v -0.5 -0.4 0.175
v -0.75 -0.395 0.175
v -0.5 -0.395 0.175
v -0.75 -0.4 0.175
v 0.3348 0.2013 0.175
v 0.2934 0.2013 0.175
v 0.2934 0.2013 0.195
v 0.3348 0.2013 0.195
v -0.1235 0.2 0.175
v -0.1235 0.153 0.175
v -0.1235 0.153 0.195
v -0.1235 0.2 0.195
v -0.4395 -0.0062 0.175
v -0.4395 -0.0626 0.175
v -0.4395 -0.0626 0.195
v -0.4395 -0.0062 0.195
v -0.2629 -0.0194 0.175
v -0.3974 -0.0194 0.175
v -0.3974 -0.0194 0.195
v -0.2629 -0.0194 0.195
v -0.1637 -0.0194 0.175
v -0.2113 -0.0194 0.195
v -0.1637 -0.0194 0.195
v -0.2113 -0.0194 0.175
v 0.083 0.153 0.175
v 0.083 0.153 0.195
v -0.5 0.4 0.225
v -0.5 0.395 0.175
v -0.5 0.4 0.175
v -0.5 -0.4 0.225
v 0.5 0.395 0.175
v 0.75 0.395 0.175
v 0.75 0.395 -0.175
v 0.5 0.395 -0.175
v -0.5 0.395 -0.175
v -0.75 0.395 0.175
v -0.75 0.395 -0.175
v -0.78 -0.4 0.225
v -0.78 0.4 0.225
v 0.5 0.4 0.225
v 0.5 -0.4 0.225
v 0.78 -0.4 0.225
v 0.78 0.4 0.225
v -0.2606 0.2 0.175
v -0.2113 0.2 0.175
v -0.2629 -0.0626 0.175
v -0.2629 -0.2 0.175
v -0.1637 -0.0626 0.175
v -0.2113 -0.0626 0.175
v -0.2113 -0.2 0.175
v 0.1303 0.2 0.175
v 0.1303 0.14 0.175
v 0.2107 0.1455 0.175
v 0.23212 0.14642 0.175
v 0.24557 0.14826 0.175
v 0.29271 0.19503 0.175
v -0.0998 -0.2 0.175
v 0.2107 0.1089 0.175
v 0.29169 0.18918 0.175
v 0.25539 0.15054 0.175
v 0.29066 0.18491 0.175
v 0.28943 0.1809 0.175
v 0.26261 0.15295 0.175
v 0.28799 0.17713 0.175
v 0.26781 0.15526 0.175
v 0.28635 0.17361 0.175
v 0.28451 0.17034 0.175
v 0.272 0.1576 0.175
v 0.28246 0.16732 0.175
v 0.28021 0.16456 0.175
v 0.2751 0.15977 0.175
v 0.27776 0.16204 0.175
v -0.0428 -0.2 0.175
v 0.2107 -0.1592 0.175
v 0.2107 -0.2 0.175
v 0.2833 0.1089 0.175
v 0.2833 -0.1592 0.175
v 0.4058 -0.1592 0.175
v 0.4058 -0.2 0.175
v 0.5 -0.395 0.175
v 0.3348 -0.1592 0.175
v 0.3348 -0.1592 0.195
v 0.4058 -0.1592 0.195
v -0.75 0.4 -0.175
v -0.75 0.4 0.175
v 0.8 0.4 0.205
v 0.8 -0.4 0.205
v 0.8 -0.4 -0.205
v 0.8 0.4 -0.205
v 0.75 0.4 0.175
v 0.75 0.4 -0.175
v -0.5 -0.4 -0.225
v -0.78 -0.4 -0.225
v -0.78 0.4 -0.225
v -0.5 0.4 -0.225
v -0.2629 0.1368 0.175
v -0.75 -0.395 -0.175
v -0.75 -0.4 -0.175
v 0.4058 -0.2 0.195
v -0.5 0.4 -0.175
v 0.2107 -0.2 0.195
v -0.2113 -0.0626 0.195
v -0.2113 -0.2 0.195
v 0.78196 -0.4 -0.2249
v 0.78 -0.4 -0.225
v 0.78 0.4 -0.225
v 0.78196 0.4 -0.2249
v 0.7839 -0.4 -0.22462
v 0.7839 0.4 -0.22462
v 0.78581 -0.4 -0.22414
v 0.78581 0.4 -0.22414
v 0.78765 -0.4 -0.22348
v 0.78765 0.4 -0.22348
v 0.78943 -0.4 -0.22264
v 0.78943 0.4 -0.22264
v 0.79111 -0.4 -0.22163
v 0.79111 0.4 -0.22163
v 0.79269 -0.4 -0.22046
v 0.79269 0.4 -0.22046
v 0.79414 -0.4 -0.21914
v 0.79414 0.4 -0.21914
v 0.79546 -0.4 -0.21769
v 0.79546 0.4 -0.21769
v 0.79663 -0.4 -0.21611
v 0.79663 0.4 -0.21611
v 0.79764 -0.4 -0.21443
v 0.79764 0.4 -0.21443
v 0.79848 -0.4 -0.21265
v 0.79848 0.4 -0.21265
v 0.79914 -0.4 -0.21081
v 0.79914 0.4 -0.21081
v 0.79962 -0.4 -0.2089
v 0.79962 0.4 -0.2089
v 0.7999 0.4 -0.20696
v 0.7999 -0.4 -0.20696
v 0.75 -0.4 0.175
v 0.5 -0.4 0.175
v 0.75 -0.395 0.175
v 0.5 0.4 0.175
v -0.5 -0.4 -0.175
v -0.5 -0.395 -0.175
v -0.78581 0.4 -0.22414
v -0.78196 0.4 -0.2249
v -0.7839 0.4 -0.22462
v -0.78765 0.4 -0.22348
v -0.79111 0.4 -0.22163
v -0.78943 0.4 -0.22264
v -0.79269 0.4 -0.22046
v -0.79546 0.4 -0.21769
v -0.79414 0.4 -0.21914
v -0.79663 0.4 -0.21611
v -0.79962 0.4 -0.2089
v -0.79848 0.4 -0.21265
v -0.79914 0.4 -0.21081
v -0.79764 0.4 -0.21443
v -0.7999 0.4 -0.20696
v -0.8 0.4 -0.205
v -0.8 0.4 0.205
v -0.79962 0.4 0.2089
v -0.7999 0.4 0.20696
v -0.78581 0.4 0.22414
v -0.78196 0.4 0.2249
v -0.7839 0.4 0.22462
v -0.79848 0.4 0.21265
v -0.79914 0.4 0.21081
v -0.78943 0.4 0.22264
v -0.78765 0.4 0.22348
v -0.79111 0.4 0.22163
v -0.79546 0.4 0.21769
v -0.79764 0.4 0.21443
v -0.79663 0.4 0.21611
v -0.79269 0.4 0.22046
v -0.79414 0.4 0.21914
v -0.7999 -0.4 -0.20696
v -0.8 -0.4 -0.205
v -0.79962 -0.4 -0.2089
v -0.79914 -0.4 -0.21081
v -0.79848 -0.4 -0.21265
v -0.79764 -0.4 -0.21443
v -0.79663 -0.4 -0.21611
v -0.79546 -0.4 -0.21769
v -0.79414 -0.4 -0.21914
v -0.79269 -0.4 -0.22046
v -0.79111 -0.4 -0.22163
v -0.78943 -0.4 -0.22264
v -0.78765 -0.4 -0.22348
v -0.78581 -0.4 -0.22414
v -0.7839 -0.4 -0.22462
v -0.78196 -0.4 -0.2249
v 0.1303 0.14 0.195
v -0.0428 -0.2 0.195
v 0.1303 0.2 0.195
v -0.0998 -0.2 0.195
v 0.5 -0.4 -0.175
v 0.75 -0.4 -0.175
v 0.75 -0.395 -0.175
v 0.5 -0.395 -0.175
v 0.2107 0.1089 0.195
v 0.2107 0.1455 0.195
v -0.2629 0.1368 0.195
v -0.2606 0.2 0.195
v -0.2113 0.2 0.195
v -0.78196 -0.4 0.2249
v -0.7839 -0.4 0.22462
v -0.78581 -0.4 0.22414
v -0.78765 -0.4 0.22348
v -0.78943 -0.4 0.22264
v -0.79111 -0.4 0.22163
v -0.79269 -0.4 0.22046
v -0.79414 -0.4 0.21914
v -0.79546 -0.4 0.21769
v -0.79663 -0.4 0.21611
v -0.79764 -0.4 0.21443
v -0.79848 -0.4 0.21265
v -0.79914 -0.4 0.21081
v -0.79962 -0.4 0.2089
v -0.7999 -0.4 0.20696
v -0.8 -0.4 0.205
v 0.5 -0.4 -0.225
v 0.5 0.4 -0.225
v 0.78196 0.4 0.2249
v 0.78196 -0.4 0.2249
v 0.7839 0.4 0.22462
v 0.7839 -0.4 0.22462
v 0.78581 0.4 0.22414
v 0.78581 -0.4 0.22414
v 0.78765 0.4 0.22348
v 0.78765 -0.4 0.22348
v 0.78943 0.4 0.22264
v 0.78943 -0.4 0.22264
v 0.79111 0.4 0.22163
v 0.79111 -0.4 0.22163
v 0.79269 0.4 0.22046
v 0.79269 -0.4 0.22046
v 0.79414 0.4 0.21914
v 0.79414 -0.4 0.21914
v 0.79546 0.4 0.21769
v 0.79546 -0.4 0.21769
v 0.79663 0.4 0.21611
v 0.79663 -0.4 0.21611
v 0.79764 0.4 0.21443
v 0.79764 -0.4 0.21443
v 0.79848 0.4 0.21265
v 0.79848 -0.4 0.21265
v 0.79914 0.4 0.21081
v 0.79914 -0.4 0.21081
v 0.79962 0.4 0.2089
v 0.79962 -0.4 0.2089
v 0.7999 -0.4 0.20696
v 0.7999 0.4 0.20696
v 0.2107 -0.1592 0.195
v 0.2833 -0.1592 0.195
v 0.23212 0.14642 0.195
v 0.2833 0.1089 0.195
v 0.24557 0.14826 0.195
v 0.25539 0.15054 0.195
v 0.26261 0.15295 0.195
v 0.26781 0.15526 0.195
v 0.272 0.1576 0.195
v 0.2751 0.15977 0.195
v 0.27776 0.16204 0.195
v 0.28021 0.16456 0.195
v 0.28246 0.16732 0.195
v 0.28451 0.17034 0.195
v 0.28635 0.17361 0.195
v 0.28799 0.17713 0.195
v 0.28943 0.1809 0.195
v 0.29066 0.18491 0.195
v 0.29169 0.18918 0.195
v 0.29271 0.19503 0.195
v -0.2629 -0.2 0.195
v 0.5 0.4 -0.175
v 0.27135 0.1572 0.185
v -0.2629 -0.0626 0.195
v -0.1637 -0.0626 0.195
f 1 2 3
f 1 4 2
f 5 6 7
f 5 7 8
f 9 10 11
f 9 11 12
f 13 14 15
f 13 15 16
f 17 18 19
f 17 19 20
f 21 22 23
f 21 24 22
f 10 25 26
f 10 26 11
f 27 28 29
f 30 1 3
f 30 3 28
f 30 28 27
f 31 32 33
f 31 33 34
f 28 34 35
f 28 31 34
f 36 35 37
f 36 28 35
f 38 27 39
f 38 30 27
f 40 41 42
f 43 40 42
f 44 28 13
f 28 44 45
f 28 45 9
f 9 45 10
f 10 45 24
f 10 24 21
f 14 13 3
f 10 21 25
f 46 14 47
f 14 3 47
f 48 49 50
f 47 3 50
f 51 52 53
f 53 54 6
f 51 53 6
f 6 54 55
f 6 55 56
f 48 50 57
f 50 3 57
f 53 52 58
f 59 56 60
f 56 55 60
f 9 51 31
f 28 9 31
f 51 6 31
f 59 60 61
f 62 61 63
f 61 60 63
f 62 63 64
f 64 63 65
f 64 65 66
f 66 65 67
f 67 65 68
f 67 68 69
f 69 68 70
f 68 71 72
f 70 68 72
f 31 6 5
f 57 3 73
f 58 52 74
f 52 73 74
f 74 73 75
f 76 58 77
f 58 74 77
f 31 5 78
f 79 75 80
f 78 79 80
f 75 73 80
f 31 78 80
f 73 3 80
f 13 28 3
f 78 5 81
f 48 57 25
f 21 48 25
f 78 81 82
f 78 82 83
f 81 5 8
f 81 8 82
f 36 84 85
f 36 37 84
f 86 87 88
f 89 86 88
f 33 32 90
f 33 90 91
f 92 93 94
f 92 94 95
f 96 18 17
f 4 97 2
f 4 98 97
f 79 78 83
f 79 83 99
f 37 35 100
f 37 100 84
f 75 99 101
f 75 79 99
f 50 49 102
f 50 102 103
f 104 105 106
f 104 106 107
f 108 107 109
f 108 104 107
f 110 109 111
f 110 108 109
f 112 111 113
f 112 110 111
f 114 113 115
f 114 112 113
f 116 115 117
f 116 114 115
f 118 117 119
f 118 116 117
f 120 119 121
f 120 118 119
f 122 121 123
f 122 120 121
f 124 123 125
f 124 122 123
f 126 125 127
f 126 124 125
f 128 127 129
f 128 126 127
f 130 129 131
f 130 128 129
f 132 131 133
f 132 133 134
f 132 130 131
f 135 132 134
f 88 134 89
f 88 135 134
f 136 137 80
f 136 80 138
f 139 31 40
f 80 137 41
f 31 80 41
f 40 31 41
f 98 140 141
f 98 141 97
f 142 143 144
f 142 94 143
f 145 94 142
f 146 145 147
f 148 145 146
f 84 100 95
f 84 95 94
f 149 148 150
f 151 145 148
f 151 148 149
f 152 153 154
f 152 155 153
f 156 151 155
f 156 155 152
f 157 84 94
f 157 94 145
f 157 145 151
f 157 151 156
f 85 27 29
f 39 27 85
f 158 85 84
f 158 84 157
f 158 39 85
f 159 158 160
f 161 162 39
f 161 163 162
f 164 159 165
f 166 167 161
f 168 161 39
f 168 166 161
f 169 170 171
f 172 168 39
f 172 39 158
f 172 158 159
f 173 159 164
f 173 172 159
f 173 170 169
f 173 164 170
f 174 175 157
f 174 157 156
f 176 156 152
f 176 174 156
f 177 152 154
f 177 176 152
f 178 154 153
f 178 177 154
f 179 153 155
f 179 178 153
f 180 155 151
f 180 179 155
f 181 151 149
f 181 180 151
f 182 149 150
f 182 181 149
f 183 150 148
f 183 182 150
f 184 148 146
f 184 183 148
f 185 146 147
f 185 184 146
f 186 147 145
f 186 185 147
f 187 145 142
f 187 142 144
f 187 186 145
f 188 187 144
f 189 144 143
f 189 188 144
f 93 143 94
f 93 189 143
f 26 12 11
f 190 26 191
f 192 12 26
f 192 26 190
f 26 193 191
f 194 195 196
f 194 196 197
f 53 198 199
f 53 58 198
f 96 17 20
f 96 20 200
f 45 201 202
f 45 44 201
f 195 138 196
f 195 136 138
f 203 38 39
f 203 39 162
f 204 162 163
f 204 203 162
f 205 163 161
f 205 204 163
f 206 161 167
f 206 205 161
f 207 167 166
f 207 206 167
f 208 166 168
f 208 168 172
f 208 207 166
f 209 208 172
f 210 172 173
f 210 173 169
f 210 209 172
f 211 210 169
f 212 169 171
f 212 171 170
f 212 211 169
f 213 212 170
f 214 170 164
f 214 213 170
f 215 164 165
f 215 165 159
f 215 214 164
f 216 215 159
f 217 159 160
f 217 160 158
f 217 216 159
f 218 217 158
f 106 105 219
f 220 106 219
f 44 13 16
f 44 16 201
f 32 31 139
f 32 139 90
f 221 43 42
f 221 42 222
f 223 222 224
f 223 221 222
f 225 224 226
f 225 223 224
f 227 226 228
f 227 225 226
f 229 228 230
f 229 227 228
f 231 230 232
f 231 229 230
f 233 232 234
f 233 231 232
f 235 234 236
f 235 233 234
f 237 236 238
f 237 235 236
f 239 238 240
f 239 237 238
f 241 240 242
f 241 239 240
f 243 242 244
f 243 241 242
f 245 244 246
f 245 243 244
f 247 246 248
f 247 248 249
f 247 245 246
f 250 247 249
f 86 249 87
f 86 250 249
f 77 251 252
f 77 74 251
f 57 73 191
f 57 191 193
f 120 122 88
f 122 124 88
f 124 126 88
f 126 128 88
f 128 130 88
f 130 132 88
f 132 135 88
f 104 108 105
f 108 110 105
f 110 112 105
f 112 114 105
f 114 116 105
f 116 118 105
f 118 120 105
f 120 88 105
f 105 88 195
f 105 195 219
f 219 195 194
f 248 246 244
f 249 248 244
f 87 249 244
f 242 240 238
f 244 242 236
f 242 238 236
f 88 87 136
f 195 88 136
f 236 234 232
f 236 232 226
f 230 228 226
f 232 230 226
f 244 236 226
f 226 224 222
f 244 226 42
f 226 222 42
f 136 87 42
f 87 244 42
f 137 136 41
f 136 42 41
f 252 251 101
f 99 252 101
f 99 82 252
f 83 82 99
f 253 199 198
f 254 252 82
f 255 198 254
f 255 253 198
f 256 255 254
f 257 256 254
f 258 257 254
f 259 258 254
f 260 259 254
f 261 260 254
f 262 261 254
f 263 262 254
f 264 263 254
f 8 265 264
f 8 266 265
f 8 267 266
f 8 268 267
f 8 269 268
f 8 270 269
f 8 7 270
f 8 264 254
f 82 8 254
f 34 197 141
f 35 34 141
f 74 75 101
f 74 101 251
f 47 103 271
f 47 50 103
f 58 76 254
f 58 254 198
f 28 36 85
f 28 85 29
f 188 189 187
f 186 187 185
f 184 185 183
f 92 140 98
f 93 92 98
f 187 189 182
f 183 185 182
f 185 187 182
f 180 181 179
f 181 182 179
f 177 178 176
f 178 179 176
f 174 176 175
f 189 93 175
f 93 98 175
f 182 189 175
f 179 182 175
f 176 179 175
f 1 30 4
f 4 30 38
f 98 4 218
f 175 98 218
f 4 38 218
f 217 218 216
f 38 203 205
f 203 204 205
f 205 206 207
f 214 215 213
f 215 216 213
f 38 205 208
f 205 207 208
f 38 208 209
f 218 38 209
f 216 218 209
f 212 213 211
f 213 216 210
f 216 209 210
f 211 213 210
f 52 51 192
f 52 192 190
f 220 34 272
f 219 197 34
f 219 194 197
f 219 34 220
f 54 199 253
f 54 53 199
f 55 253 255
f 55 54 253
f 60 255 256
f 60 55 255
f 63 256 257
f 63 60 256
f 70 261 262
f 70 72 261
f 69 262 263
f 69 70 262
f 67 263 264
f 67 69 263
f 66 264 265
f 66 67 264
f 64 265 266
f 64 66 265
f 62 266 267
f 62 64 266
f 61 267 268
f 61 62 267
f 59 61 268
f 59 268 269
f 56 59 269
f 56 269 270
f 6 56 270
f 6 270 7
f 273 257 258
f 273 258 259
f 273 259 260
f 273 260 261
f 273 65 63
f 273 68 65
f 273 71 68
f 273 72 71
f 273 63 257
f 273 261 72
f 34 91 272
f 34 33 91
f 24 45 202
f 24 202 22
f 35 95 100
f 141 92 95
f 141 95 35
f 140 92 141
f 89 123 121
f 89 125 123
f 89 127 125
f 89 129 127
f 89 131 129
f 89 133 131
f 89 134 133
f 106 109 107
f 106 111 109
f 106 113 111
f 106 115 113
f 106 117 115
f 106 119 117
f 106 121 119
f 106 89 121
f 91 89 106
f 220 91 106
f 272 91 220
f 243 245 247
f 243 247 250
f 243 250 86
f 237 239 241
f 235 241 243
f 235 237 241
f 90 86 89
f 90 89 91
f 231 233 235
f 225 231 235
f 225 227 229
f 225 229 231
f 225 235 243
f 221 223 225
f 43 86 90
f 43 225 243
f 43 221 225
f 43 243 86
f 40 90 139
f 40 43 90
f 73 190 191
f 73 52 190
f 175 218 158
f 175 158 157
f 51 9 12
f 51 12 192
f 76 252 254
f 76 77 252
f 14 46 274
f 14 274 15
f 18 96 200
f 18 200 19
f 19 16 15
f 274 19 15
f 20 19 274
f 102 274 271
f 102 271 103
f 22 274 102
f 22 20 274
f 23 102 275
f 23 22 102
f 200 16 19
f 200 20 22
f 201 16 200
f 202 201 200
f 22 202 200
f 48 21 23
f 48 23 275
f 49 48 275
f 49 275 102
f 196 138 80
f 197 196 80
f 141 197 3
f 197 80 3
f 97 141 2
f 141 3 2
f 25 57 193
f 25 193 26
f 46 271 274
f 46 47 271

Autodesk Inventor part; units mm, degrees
ref_plane "YZ Plane" through (0, 0, 0) normal (1, 0, 0) x (0, 1, 0)
ref_plane "XZ Plane" through (0, 0, 0) normal (0, 1, 0) x (-1, 0, 0)
ref_plane "XY Plane" through (0, 0, 0) normal (0, 0, 1) x (1, 0, 0)
sketch "Sketch1" plane through (0, 0, 0) normal (0, 1, 0) x (-1, 0, 0)
  line L0 (0.75, 0.175) -> (-0.75, 0.175)
  line L1 (-0.75, 0.175) -> (-0.75, -0.175)
  line L2 (-0.75, -0.175) -> (0.75, -0.175)
  line L3 (0.75, -0.175) -> (0.75, 0.175)
  line L4 (0.5, 0.175) -> (0.5, 0.225)
  line L5 (0.5, 0.225) -> (0.8, 0.225)
  line L6 (0.8, 0.225) -> (0.8, -0.225)
  line L7 (0.8, -0.225) -> (0.5, -0.225)
  line L8 (0.5, -0.225) -> (0.5, -0.175)
  line L9 (-0.5, 0.175) -> (-0.5, 0.225)
  line L10 (-0.5, 0.225) -> (-0.8, 0.225)
  line L11 (-0.8, 0.225) -> (-0.8, -0.225)
  line L12 (-0.8, -0.225) -> (-0.5, -0.225)
  line L13 (-0.5, -0.175) -> (-0.5, -0.225)
  line L14 (0.5, 0.175) -> (-0.5, 0.175)
  point P0 (0, 0)
  point P1 (0, 0.175)
  point P2 (0.75, 0)
  dimension "d0" = 1.6
  dimension "d1" = 0.05
  dimension "d2" = 0.05
  dimension "d3" = 0.45
  dimension "d4" = 0.3
extrude "Extrusion1" add sketch "Sketch1" along normal mid plane 0.8 contours L0 L4 L5 L6 L7 L8 L2 L3 | L0 L1 L2 L13 L12 L11 L10 L9
extrude "Extrusion2" add sketch "Sketch1" along normal mid plane 0.79 contours L3 L2 L1 L0
sketch "Sketch2" plane through (-0.5, -0.395, 0.175) normal (0, 0, 1) x (1, 0, 0)
  line L0 (0, 0) -> (0, 0.79) projected
  line L1 (1, 0) -> (0, 0) projected
  line L2 (1, 0) -> (1, 0.79) projected
  line L3 (0, 0.79) -> (1, 0.79) projected
  line L4 (0, 0.395) -> (1, 0.395) construction
  line L5 (0.3363, 0.3324) -> (0.2887, 0.3324)
  line L6 (0.2887, 0.3324) -> (0.2887, 0.195)
  line L7 (0.2887, 0.195) -> (0.2371, 0.195)
  line L8 (0.2371, 0.195) -> (0.2371, 0.3324)
  line L9 (0.2371, 0.3324) -> (0.0605, 0.3324)
  line L10 (0.0605, 0.3324) -> (0.0605, 0.3888)
  line L11 (0.0605, 0.3888) -> (0.2394, 0.595)
  line L12 (0.2394, 0.595) -> (0.2887, 0.595)
  line L13 (0.2887, 0.595) -> (0.2887, 0.3756)
  line L14 (0.2887, 0.3756) -> (0.3363, 0.3756)
  line L15 (0.3363, 0.3756) -> (0.3363, 0.3324)
  line L16 (0.2371, 0.3756) -> (0.2371, 0.5318)
  line L17 (0.2371, 0.5318) -> (0.1026, 0.3756)
  line L18 (0.1026, 0.3756) -> (0.2371, 0.3756)
  line L19 (0.6303, 0.535) -> (0.4572, 0.195)
  line L20 (0.4572, 0.195) -> (0.4002, 0.195)
  line L21 (0.4002, 0.195) -> (0.583, 0.548)
  line L22 (0.583, 0.548) -> (0.3765, 0.548)
  line L23 (0.3765, 0.548) -> (0.3765, 0.595)
  line L24 (0.3765, 0.595) -> (0.6303, 0.595)
  line L25 (0.6303, 0.595) -> (0.6303, 0.535)
  line L26 (0.9058, 0.195) -> (0.7107, 0.195)
  line L27 (0.7107, 0.195) -> (0.7107, 0.2358)
  line L28 (0.7107, 0.2358) -> (0.7833, 0.2358)
  line L29 (0.7833, 0.2358) -> (0.7833, 0.5039)
  line L30 (0.7833, 0.5039) -> (0.7107, 0.5039)
  line L31 (0.7107, 0.5039) -> (0.7107, 0.5405)
  spline S0 degree 2 poles (0.7107, 0.5405) (0.7519, 0.5405) (0.7908, 0.5639) (0.7934, 0.5963) knots 0 0 0 1 2 2 2
  line L32 (0.7934, 0.5963) -> (0.8348, 0.5963)
  line L33 (0.8348, 0.5963) -> (0.8348, 0.2358)
  line L34 (0.8348, 0.2358) -> (0.9058, 0.2358)
  line L35 (0.9058, 0.2358) -> (0.9058, 0.195)
  point P0 (0.5, 0.395)
extrude "Extrusion3" add sketch "Sketch2" along normal blind 0.02 contours L5 L6 L7 L8 L9 L10 L11 L12 L13 L14 L15 | L19 L20 L21 L22 L23 L24 L25 | L26 L27 L28 L29 L30 L31 S0 L32 L33 L34 L35
fillet "Fillet1" radius 0.02 4 edges at (-0.8, 0, 0.225) (-0.8, 0, -0.225) (0.8, 0, 0.225) (0.8, 0, -0.225)
equation "\"d2\" = d1"
properties part number "21-1001" material "Copper"
